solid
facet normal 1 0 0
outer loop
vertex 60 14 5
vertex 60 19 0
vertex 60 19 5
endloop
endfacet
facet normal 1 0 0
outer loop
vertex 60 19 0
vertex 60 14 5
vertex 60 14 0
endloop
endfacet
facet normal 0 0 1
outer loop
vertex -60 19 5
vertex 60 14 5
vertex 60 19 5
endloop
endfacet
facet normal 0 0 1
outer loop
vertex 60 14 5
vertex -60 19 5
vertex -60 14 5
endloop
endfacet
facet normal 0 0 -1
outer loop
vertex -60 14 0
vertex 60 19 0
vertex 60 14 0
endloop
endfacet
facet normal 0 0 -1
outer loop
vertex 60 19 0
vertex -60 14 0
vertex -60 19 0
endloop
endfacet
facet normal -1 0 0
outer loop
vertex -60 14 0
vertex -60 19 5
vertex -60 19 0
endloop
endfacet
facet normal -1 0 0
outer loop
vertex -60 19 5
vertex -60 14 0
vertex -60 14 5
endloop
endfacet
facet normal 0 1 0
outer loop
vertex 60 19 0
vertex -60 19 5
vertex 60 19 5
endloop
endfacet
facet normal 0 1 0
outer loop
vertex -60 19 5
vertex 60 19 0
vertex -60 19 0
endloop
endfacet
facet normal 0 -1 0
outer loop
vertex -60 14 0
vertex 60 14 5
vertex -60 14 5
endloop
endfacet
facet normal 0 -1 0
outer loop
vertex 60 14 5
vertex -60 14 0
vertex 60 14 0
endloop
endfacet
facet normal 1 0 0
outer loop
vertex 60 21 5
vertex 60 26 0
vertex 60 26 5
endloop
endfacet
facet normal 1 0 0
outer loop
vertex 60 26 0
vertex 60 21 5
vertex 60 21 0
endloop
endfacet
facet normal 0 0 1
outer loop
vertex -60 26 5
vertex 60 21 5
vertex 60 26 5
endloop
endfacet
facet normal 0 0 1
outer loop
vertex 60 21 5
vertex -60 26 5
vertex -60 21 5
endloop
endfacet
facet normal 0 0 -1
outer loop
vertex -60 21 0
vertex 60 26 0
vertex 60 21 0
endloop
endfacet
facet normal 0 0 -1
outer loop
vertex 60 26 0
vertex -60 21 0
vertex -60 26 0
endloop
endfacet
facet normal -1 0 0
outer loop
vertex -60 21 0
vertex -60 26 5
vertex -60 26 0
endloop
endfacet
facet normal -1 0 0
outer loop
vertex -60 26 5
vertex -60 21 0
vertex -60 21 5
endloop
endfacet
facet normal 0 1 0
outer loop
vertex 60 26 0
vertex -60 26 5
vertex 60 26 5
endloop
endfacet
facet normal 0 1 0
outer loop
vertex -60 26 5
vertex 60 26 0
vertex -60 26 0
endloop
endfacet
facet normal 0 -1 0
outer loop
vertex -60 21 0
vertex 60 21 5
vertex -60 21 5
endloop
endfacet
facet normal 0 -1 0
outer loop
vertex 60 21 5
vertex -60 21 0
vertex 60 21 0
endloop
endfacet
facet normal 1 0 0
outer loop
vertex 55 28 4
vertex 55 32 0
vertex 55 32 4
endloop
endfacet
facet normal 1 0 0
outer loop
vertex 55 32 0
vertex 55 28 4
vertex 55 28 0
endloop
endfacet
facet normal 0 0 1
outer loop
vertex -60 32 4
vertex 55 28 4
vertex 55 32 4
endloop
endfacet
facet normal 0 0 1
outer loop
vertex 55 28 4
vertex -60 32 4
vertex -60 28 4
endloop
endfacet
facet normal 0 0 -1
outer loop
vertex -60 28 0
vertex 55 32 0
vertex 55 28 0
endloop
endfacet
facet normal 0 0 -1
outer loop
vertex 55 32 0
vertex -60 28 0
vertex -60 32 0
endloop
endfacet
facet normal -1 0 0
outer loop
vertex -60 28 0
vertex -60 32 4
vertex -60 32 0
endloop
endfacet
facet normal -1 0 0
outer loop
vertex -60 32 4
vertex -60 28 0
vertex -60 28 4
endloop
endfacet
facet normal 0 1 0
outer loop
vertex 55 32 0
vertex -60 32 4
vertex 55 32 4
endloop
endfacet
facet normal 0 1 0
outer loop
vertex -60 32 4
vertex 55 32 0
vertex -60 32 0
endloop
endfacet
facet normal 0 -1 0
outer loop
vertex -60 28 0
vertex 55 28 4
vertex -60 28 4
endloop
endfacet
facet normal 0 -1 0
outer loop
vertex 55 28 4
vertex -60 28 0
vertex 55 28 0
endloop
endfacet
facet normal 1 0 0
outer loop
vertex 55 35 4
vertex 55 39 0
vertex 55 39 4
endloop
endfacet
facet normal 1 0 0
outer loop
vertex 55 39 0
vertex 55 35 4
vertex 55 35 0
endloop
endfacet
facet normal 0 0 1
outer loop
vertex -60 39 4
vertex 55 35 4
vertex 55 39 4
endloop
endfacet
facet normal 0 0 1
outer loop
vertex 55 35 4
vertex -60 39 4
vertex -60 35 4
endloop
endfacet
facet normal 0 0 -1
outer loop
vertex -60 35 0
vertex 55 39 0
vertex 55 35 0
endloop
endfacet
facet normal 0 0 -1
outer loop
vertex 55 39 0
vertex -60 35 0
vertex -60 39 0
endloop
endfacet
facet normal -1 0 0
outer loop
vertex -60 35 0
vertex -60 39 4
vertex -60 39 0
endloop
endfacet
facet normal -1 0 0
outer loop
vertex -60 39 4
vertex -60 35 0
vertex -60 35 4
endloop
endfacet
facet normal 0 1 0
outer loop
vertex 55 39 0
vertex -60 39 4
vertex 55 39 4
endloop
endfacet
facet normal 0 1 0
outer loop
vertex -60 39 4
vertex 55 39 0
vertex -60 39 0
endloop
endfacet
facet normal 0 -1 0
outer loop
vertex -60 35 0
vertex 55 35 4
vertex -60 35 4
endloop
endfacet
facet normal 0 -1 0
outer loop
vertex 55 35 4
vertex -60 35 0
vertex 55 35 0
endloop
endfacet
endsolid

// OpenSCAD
union() {
//        translate([-60,-4,0])
//            cube([125,6,6]); 
//        translate([-60,5,0])
//            cube([125,6,6]);

//        translate([-60,14,0])
//            cube([120,5,5]);
//        translate([-60,21,0])
//            cube([120,5,5]); 
//        
//        translate([-60,28,0])
//            cube([115,4,4]);
//        translate([-60,35,0])
//            cube([115,4,4]); 
    
//        translate([-60,42,0])
//            cube([105,3,3]);
//        translate([-60,49,0])
//            cube([105,3,3]); 
    
    
        translate([-60,14,0])
            cube([120,5,5]);
        translate([-60,21,0])
            cube([120,5,5]); 
        
        translate([-60,28,0])
            cube([115,4,4]);
        translate([-60,35,0])
            cube([115,4,4]); 
}
